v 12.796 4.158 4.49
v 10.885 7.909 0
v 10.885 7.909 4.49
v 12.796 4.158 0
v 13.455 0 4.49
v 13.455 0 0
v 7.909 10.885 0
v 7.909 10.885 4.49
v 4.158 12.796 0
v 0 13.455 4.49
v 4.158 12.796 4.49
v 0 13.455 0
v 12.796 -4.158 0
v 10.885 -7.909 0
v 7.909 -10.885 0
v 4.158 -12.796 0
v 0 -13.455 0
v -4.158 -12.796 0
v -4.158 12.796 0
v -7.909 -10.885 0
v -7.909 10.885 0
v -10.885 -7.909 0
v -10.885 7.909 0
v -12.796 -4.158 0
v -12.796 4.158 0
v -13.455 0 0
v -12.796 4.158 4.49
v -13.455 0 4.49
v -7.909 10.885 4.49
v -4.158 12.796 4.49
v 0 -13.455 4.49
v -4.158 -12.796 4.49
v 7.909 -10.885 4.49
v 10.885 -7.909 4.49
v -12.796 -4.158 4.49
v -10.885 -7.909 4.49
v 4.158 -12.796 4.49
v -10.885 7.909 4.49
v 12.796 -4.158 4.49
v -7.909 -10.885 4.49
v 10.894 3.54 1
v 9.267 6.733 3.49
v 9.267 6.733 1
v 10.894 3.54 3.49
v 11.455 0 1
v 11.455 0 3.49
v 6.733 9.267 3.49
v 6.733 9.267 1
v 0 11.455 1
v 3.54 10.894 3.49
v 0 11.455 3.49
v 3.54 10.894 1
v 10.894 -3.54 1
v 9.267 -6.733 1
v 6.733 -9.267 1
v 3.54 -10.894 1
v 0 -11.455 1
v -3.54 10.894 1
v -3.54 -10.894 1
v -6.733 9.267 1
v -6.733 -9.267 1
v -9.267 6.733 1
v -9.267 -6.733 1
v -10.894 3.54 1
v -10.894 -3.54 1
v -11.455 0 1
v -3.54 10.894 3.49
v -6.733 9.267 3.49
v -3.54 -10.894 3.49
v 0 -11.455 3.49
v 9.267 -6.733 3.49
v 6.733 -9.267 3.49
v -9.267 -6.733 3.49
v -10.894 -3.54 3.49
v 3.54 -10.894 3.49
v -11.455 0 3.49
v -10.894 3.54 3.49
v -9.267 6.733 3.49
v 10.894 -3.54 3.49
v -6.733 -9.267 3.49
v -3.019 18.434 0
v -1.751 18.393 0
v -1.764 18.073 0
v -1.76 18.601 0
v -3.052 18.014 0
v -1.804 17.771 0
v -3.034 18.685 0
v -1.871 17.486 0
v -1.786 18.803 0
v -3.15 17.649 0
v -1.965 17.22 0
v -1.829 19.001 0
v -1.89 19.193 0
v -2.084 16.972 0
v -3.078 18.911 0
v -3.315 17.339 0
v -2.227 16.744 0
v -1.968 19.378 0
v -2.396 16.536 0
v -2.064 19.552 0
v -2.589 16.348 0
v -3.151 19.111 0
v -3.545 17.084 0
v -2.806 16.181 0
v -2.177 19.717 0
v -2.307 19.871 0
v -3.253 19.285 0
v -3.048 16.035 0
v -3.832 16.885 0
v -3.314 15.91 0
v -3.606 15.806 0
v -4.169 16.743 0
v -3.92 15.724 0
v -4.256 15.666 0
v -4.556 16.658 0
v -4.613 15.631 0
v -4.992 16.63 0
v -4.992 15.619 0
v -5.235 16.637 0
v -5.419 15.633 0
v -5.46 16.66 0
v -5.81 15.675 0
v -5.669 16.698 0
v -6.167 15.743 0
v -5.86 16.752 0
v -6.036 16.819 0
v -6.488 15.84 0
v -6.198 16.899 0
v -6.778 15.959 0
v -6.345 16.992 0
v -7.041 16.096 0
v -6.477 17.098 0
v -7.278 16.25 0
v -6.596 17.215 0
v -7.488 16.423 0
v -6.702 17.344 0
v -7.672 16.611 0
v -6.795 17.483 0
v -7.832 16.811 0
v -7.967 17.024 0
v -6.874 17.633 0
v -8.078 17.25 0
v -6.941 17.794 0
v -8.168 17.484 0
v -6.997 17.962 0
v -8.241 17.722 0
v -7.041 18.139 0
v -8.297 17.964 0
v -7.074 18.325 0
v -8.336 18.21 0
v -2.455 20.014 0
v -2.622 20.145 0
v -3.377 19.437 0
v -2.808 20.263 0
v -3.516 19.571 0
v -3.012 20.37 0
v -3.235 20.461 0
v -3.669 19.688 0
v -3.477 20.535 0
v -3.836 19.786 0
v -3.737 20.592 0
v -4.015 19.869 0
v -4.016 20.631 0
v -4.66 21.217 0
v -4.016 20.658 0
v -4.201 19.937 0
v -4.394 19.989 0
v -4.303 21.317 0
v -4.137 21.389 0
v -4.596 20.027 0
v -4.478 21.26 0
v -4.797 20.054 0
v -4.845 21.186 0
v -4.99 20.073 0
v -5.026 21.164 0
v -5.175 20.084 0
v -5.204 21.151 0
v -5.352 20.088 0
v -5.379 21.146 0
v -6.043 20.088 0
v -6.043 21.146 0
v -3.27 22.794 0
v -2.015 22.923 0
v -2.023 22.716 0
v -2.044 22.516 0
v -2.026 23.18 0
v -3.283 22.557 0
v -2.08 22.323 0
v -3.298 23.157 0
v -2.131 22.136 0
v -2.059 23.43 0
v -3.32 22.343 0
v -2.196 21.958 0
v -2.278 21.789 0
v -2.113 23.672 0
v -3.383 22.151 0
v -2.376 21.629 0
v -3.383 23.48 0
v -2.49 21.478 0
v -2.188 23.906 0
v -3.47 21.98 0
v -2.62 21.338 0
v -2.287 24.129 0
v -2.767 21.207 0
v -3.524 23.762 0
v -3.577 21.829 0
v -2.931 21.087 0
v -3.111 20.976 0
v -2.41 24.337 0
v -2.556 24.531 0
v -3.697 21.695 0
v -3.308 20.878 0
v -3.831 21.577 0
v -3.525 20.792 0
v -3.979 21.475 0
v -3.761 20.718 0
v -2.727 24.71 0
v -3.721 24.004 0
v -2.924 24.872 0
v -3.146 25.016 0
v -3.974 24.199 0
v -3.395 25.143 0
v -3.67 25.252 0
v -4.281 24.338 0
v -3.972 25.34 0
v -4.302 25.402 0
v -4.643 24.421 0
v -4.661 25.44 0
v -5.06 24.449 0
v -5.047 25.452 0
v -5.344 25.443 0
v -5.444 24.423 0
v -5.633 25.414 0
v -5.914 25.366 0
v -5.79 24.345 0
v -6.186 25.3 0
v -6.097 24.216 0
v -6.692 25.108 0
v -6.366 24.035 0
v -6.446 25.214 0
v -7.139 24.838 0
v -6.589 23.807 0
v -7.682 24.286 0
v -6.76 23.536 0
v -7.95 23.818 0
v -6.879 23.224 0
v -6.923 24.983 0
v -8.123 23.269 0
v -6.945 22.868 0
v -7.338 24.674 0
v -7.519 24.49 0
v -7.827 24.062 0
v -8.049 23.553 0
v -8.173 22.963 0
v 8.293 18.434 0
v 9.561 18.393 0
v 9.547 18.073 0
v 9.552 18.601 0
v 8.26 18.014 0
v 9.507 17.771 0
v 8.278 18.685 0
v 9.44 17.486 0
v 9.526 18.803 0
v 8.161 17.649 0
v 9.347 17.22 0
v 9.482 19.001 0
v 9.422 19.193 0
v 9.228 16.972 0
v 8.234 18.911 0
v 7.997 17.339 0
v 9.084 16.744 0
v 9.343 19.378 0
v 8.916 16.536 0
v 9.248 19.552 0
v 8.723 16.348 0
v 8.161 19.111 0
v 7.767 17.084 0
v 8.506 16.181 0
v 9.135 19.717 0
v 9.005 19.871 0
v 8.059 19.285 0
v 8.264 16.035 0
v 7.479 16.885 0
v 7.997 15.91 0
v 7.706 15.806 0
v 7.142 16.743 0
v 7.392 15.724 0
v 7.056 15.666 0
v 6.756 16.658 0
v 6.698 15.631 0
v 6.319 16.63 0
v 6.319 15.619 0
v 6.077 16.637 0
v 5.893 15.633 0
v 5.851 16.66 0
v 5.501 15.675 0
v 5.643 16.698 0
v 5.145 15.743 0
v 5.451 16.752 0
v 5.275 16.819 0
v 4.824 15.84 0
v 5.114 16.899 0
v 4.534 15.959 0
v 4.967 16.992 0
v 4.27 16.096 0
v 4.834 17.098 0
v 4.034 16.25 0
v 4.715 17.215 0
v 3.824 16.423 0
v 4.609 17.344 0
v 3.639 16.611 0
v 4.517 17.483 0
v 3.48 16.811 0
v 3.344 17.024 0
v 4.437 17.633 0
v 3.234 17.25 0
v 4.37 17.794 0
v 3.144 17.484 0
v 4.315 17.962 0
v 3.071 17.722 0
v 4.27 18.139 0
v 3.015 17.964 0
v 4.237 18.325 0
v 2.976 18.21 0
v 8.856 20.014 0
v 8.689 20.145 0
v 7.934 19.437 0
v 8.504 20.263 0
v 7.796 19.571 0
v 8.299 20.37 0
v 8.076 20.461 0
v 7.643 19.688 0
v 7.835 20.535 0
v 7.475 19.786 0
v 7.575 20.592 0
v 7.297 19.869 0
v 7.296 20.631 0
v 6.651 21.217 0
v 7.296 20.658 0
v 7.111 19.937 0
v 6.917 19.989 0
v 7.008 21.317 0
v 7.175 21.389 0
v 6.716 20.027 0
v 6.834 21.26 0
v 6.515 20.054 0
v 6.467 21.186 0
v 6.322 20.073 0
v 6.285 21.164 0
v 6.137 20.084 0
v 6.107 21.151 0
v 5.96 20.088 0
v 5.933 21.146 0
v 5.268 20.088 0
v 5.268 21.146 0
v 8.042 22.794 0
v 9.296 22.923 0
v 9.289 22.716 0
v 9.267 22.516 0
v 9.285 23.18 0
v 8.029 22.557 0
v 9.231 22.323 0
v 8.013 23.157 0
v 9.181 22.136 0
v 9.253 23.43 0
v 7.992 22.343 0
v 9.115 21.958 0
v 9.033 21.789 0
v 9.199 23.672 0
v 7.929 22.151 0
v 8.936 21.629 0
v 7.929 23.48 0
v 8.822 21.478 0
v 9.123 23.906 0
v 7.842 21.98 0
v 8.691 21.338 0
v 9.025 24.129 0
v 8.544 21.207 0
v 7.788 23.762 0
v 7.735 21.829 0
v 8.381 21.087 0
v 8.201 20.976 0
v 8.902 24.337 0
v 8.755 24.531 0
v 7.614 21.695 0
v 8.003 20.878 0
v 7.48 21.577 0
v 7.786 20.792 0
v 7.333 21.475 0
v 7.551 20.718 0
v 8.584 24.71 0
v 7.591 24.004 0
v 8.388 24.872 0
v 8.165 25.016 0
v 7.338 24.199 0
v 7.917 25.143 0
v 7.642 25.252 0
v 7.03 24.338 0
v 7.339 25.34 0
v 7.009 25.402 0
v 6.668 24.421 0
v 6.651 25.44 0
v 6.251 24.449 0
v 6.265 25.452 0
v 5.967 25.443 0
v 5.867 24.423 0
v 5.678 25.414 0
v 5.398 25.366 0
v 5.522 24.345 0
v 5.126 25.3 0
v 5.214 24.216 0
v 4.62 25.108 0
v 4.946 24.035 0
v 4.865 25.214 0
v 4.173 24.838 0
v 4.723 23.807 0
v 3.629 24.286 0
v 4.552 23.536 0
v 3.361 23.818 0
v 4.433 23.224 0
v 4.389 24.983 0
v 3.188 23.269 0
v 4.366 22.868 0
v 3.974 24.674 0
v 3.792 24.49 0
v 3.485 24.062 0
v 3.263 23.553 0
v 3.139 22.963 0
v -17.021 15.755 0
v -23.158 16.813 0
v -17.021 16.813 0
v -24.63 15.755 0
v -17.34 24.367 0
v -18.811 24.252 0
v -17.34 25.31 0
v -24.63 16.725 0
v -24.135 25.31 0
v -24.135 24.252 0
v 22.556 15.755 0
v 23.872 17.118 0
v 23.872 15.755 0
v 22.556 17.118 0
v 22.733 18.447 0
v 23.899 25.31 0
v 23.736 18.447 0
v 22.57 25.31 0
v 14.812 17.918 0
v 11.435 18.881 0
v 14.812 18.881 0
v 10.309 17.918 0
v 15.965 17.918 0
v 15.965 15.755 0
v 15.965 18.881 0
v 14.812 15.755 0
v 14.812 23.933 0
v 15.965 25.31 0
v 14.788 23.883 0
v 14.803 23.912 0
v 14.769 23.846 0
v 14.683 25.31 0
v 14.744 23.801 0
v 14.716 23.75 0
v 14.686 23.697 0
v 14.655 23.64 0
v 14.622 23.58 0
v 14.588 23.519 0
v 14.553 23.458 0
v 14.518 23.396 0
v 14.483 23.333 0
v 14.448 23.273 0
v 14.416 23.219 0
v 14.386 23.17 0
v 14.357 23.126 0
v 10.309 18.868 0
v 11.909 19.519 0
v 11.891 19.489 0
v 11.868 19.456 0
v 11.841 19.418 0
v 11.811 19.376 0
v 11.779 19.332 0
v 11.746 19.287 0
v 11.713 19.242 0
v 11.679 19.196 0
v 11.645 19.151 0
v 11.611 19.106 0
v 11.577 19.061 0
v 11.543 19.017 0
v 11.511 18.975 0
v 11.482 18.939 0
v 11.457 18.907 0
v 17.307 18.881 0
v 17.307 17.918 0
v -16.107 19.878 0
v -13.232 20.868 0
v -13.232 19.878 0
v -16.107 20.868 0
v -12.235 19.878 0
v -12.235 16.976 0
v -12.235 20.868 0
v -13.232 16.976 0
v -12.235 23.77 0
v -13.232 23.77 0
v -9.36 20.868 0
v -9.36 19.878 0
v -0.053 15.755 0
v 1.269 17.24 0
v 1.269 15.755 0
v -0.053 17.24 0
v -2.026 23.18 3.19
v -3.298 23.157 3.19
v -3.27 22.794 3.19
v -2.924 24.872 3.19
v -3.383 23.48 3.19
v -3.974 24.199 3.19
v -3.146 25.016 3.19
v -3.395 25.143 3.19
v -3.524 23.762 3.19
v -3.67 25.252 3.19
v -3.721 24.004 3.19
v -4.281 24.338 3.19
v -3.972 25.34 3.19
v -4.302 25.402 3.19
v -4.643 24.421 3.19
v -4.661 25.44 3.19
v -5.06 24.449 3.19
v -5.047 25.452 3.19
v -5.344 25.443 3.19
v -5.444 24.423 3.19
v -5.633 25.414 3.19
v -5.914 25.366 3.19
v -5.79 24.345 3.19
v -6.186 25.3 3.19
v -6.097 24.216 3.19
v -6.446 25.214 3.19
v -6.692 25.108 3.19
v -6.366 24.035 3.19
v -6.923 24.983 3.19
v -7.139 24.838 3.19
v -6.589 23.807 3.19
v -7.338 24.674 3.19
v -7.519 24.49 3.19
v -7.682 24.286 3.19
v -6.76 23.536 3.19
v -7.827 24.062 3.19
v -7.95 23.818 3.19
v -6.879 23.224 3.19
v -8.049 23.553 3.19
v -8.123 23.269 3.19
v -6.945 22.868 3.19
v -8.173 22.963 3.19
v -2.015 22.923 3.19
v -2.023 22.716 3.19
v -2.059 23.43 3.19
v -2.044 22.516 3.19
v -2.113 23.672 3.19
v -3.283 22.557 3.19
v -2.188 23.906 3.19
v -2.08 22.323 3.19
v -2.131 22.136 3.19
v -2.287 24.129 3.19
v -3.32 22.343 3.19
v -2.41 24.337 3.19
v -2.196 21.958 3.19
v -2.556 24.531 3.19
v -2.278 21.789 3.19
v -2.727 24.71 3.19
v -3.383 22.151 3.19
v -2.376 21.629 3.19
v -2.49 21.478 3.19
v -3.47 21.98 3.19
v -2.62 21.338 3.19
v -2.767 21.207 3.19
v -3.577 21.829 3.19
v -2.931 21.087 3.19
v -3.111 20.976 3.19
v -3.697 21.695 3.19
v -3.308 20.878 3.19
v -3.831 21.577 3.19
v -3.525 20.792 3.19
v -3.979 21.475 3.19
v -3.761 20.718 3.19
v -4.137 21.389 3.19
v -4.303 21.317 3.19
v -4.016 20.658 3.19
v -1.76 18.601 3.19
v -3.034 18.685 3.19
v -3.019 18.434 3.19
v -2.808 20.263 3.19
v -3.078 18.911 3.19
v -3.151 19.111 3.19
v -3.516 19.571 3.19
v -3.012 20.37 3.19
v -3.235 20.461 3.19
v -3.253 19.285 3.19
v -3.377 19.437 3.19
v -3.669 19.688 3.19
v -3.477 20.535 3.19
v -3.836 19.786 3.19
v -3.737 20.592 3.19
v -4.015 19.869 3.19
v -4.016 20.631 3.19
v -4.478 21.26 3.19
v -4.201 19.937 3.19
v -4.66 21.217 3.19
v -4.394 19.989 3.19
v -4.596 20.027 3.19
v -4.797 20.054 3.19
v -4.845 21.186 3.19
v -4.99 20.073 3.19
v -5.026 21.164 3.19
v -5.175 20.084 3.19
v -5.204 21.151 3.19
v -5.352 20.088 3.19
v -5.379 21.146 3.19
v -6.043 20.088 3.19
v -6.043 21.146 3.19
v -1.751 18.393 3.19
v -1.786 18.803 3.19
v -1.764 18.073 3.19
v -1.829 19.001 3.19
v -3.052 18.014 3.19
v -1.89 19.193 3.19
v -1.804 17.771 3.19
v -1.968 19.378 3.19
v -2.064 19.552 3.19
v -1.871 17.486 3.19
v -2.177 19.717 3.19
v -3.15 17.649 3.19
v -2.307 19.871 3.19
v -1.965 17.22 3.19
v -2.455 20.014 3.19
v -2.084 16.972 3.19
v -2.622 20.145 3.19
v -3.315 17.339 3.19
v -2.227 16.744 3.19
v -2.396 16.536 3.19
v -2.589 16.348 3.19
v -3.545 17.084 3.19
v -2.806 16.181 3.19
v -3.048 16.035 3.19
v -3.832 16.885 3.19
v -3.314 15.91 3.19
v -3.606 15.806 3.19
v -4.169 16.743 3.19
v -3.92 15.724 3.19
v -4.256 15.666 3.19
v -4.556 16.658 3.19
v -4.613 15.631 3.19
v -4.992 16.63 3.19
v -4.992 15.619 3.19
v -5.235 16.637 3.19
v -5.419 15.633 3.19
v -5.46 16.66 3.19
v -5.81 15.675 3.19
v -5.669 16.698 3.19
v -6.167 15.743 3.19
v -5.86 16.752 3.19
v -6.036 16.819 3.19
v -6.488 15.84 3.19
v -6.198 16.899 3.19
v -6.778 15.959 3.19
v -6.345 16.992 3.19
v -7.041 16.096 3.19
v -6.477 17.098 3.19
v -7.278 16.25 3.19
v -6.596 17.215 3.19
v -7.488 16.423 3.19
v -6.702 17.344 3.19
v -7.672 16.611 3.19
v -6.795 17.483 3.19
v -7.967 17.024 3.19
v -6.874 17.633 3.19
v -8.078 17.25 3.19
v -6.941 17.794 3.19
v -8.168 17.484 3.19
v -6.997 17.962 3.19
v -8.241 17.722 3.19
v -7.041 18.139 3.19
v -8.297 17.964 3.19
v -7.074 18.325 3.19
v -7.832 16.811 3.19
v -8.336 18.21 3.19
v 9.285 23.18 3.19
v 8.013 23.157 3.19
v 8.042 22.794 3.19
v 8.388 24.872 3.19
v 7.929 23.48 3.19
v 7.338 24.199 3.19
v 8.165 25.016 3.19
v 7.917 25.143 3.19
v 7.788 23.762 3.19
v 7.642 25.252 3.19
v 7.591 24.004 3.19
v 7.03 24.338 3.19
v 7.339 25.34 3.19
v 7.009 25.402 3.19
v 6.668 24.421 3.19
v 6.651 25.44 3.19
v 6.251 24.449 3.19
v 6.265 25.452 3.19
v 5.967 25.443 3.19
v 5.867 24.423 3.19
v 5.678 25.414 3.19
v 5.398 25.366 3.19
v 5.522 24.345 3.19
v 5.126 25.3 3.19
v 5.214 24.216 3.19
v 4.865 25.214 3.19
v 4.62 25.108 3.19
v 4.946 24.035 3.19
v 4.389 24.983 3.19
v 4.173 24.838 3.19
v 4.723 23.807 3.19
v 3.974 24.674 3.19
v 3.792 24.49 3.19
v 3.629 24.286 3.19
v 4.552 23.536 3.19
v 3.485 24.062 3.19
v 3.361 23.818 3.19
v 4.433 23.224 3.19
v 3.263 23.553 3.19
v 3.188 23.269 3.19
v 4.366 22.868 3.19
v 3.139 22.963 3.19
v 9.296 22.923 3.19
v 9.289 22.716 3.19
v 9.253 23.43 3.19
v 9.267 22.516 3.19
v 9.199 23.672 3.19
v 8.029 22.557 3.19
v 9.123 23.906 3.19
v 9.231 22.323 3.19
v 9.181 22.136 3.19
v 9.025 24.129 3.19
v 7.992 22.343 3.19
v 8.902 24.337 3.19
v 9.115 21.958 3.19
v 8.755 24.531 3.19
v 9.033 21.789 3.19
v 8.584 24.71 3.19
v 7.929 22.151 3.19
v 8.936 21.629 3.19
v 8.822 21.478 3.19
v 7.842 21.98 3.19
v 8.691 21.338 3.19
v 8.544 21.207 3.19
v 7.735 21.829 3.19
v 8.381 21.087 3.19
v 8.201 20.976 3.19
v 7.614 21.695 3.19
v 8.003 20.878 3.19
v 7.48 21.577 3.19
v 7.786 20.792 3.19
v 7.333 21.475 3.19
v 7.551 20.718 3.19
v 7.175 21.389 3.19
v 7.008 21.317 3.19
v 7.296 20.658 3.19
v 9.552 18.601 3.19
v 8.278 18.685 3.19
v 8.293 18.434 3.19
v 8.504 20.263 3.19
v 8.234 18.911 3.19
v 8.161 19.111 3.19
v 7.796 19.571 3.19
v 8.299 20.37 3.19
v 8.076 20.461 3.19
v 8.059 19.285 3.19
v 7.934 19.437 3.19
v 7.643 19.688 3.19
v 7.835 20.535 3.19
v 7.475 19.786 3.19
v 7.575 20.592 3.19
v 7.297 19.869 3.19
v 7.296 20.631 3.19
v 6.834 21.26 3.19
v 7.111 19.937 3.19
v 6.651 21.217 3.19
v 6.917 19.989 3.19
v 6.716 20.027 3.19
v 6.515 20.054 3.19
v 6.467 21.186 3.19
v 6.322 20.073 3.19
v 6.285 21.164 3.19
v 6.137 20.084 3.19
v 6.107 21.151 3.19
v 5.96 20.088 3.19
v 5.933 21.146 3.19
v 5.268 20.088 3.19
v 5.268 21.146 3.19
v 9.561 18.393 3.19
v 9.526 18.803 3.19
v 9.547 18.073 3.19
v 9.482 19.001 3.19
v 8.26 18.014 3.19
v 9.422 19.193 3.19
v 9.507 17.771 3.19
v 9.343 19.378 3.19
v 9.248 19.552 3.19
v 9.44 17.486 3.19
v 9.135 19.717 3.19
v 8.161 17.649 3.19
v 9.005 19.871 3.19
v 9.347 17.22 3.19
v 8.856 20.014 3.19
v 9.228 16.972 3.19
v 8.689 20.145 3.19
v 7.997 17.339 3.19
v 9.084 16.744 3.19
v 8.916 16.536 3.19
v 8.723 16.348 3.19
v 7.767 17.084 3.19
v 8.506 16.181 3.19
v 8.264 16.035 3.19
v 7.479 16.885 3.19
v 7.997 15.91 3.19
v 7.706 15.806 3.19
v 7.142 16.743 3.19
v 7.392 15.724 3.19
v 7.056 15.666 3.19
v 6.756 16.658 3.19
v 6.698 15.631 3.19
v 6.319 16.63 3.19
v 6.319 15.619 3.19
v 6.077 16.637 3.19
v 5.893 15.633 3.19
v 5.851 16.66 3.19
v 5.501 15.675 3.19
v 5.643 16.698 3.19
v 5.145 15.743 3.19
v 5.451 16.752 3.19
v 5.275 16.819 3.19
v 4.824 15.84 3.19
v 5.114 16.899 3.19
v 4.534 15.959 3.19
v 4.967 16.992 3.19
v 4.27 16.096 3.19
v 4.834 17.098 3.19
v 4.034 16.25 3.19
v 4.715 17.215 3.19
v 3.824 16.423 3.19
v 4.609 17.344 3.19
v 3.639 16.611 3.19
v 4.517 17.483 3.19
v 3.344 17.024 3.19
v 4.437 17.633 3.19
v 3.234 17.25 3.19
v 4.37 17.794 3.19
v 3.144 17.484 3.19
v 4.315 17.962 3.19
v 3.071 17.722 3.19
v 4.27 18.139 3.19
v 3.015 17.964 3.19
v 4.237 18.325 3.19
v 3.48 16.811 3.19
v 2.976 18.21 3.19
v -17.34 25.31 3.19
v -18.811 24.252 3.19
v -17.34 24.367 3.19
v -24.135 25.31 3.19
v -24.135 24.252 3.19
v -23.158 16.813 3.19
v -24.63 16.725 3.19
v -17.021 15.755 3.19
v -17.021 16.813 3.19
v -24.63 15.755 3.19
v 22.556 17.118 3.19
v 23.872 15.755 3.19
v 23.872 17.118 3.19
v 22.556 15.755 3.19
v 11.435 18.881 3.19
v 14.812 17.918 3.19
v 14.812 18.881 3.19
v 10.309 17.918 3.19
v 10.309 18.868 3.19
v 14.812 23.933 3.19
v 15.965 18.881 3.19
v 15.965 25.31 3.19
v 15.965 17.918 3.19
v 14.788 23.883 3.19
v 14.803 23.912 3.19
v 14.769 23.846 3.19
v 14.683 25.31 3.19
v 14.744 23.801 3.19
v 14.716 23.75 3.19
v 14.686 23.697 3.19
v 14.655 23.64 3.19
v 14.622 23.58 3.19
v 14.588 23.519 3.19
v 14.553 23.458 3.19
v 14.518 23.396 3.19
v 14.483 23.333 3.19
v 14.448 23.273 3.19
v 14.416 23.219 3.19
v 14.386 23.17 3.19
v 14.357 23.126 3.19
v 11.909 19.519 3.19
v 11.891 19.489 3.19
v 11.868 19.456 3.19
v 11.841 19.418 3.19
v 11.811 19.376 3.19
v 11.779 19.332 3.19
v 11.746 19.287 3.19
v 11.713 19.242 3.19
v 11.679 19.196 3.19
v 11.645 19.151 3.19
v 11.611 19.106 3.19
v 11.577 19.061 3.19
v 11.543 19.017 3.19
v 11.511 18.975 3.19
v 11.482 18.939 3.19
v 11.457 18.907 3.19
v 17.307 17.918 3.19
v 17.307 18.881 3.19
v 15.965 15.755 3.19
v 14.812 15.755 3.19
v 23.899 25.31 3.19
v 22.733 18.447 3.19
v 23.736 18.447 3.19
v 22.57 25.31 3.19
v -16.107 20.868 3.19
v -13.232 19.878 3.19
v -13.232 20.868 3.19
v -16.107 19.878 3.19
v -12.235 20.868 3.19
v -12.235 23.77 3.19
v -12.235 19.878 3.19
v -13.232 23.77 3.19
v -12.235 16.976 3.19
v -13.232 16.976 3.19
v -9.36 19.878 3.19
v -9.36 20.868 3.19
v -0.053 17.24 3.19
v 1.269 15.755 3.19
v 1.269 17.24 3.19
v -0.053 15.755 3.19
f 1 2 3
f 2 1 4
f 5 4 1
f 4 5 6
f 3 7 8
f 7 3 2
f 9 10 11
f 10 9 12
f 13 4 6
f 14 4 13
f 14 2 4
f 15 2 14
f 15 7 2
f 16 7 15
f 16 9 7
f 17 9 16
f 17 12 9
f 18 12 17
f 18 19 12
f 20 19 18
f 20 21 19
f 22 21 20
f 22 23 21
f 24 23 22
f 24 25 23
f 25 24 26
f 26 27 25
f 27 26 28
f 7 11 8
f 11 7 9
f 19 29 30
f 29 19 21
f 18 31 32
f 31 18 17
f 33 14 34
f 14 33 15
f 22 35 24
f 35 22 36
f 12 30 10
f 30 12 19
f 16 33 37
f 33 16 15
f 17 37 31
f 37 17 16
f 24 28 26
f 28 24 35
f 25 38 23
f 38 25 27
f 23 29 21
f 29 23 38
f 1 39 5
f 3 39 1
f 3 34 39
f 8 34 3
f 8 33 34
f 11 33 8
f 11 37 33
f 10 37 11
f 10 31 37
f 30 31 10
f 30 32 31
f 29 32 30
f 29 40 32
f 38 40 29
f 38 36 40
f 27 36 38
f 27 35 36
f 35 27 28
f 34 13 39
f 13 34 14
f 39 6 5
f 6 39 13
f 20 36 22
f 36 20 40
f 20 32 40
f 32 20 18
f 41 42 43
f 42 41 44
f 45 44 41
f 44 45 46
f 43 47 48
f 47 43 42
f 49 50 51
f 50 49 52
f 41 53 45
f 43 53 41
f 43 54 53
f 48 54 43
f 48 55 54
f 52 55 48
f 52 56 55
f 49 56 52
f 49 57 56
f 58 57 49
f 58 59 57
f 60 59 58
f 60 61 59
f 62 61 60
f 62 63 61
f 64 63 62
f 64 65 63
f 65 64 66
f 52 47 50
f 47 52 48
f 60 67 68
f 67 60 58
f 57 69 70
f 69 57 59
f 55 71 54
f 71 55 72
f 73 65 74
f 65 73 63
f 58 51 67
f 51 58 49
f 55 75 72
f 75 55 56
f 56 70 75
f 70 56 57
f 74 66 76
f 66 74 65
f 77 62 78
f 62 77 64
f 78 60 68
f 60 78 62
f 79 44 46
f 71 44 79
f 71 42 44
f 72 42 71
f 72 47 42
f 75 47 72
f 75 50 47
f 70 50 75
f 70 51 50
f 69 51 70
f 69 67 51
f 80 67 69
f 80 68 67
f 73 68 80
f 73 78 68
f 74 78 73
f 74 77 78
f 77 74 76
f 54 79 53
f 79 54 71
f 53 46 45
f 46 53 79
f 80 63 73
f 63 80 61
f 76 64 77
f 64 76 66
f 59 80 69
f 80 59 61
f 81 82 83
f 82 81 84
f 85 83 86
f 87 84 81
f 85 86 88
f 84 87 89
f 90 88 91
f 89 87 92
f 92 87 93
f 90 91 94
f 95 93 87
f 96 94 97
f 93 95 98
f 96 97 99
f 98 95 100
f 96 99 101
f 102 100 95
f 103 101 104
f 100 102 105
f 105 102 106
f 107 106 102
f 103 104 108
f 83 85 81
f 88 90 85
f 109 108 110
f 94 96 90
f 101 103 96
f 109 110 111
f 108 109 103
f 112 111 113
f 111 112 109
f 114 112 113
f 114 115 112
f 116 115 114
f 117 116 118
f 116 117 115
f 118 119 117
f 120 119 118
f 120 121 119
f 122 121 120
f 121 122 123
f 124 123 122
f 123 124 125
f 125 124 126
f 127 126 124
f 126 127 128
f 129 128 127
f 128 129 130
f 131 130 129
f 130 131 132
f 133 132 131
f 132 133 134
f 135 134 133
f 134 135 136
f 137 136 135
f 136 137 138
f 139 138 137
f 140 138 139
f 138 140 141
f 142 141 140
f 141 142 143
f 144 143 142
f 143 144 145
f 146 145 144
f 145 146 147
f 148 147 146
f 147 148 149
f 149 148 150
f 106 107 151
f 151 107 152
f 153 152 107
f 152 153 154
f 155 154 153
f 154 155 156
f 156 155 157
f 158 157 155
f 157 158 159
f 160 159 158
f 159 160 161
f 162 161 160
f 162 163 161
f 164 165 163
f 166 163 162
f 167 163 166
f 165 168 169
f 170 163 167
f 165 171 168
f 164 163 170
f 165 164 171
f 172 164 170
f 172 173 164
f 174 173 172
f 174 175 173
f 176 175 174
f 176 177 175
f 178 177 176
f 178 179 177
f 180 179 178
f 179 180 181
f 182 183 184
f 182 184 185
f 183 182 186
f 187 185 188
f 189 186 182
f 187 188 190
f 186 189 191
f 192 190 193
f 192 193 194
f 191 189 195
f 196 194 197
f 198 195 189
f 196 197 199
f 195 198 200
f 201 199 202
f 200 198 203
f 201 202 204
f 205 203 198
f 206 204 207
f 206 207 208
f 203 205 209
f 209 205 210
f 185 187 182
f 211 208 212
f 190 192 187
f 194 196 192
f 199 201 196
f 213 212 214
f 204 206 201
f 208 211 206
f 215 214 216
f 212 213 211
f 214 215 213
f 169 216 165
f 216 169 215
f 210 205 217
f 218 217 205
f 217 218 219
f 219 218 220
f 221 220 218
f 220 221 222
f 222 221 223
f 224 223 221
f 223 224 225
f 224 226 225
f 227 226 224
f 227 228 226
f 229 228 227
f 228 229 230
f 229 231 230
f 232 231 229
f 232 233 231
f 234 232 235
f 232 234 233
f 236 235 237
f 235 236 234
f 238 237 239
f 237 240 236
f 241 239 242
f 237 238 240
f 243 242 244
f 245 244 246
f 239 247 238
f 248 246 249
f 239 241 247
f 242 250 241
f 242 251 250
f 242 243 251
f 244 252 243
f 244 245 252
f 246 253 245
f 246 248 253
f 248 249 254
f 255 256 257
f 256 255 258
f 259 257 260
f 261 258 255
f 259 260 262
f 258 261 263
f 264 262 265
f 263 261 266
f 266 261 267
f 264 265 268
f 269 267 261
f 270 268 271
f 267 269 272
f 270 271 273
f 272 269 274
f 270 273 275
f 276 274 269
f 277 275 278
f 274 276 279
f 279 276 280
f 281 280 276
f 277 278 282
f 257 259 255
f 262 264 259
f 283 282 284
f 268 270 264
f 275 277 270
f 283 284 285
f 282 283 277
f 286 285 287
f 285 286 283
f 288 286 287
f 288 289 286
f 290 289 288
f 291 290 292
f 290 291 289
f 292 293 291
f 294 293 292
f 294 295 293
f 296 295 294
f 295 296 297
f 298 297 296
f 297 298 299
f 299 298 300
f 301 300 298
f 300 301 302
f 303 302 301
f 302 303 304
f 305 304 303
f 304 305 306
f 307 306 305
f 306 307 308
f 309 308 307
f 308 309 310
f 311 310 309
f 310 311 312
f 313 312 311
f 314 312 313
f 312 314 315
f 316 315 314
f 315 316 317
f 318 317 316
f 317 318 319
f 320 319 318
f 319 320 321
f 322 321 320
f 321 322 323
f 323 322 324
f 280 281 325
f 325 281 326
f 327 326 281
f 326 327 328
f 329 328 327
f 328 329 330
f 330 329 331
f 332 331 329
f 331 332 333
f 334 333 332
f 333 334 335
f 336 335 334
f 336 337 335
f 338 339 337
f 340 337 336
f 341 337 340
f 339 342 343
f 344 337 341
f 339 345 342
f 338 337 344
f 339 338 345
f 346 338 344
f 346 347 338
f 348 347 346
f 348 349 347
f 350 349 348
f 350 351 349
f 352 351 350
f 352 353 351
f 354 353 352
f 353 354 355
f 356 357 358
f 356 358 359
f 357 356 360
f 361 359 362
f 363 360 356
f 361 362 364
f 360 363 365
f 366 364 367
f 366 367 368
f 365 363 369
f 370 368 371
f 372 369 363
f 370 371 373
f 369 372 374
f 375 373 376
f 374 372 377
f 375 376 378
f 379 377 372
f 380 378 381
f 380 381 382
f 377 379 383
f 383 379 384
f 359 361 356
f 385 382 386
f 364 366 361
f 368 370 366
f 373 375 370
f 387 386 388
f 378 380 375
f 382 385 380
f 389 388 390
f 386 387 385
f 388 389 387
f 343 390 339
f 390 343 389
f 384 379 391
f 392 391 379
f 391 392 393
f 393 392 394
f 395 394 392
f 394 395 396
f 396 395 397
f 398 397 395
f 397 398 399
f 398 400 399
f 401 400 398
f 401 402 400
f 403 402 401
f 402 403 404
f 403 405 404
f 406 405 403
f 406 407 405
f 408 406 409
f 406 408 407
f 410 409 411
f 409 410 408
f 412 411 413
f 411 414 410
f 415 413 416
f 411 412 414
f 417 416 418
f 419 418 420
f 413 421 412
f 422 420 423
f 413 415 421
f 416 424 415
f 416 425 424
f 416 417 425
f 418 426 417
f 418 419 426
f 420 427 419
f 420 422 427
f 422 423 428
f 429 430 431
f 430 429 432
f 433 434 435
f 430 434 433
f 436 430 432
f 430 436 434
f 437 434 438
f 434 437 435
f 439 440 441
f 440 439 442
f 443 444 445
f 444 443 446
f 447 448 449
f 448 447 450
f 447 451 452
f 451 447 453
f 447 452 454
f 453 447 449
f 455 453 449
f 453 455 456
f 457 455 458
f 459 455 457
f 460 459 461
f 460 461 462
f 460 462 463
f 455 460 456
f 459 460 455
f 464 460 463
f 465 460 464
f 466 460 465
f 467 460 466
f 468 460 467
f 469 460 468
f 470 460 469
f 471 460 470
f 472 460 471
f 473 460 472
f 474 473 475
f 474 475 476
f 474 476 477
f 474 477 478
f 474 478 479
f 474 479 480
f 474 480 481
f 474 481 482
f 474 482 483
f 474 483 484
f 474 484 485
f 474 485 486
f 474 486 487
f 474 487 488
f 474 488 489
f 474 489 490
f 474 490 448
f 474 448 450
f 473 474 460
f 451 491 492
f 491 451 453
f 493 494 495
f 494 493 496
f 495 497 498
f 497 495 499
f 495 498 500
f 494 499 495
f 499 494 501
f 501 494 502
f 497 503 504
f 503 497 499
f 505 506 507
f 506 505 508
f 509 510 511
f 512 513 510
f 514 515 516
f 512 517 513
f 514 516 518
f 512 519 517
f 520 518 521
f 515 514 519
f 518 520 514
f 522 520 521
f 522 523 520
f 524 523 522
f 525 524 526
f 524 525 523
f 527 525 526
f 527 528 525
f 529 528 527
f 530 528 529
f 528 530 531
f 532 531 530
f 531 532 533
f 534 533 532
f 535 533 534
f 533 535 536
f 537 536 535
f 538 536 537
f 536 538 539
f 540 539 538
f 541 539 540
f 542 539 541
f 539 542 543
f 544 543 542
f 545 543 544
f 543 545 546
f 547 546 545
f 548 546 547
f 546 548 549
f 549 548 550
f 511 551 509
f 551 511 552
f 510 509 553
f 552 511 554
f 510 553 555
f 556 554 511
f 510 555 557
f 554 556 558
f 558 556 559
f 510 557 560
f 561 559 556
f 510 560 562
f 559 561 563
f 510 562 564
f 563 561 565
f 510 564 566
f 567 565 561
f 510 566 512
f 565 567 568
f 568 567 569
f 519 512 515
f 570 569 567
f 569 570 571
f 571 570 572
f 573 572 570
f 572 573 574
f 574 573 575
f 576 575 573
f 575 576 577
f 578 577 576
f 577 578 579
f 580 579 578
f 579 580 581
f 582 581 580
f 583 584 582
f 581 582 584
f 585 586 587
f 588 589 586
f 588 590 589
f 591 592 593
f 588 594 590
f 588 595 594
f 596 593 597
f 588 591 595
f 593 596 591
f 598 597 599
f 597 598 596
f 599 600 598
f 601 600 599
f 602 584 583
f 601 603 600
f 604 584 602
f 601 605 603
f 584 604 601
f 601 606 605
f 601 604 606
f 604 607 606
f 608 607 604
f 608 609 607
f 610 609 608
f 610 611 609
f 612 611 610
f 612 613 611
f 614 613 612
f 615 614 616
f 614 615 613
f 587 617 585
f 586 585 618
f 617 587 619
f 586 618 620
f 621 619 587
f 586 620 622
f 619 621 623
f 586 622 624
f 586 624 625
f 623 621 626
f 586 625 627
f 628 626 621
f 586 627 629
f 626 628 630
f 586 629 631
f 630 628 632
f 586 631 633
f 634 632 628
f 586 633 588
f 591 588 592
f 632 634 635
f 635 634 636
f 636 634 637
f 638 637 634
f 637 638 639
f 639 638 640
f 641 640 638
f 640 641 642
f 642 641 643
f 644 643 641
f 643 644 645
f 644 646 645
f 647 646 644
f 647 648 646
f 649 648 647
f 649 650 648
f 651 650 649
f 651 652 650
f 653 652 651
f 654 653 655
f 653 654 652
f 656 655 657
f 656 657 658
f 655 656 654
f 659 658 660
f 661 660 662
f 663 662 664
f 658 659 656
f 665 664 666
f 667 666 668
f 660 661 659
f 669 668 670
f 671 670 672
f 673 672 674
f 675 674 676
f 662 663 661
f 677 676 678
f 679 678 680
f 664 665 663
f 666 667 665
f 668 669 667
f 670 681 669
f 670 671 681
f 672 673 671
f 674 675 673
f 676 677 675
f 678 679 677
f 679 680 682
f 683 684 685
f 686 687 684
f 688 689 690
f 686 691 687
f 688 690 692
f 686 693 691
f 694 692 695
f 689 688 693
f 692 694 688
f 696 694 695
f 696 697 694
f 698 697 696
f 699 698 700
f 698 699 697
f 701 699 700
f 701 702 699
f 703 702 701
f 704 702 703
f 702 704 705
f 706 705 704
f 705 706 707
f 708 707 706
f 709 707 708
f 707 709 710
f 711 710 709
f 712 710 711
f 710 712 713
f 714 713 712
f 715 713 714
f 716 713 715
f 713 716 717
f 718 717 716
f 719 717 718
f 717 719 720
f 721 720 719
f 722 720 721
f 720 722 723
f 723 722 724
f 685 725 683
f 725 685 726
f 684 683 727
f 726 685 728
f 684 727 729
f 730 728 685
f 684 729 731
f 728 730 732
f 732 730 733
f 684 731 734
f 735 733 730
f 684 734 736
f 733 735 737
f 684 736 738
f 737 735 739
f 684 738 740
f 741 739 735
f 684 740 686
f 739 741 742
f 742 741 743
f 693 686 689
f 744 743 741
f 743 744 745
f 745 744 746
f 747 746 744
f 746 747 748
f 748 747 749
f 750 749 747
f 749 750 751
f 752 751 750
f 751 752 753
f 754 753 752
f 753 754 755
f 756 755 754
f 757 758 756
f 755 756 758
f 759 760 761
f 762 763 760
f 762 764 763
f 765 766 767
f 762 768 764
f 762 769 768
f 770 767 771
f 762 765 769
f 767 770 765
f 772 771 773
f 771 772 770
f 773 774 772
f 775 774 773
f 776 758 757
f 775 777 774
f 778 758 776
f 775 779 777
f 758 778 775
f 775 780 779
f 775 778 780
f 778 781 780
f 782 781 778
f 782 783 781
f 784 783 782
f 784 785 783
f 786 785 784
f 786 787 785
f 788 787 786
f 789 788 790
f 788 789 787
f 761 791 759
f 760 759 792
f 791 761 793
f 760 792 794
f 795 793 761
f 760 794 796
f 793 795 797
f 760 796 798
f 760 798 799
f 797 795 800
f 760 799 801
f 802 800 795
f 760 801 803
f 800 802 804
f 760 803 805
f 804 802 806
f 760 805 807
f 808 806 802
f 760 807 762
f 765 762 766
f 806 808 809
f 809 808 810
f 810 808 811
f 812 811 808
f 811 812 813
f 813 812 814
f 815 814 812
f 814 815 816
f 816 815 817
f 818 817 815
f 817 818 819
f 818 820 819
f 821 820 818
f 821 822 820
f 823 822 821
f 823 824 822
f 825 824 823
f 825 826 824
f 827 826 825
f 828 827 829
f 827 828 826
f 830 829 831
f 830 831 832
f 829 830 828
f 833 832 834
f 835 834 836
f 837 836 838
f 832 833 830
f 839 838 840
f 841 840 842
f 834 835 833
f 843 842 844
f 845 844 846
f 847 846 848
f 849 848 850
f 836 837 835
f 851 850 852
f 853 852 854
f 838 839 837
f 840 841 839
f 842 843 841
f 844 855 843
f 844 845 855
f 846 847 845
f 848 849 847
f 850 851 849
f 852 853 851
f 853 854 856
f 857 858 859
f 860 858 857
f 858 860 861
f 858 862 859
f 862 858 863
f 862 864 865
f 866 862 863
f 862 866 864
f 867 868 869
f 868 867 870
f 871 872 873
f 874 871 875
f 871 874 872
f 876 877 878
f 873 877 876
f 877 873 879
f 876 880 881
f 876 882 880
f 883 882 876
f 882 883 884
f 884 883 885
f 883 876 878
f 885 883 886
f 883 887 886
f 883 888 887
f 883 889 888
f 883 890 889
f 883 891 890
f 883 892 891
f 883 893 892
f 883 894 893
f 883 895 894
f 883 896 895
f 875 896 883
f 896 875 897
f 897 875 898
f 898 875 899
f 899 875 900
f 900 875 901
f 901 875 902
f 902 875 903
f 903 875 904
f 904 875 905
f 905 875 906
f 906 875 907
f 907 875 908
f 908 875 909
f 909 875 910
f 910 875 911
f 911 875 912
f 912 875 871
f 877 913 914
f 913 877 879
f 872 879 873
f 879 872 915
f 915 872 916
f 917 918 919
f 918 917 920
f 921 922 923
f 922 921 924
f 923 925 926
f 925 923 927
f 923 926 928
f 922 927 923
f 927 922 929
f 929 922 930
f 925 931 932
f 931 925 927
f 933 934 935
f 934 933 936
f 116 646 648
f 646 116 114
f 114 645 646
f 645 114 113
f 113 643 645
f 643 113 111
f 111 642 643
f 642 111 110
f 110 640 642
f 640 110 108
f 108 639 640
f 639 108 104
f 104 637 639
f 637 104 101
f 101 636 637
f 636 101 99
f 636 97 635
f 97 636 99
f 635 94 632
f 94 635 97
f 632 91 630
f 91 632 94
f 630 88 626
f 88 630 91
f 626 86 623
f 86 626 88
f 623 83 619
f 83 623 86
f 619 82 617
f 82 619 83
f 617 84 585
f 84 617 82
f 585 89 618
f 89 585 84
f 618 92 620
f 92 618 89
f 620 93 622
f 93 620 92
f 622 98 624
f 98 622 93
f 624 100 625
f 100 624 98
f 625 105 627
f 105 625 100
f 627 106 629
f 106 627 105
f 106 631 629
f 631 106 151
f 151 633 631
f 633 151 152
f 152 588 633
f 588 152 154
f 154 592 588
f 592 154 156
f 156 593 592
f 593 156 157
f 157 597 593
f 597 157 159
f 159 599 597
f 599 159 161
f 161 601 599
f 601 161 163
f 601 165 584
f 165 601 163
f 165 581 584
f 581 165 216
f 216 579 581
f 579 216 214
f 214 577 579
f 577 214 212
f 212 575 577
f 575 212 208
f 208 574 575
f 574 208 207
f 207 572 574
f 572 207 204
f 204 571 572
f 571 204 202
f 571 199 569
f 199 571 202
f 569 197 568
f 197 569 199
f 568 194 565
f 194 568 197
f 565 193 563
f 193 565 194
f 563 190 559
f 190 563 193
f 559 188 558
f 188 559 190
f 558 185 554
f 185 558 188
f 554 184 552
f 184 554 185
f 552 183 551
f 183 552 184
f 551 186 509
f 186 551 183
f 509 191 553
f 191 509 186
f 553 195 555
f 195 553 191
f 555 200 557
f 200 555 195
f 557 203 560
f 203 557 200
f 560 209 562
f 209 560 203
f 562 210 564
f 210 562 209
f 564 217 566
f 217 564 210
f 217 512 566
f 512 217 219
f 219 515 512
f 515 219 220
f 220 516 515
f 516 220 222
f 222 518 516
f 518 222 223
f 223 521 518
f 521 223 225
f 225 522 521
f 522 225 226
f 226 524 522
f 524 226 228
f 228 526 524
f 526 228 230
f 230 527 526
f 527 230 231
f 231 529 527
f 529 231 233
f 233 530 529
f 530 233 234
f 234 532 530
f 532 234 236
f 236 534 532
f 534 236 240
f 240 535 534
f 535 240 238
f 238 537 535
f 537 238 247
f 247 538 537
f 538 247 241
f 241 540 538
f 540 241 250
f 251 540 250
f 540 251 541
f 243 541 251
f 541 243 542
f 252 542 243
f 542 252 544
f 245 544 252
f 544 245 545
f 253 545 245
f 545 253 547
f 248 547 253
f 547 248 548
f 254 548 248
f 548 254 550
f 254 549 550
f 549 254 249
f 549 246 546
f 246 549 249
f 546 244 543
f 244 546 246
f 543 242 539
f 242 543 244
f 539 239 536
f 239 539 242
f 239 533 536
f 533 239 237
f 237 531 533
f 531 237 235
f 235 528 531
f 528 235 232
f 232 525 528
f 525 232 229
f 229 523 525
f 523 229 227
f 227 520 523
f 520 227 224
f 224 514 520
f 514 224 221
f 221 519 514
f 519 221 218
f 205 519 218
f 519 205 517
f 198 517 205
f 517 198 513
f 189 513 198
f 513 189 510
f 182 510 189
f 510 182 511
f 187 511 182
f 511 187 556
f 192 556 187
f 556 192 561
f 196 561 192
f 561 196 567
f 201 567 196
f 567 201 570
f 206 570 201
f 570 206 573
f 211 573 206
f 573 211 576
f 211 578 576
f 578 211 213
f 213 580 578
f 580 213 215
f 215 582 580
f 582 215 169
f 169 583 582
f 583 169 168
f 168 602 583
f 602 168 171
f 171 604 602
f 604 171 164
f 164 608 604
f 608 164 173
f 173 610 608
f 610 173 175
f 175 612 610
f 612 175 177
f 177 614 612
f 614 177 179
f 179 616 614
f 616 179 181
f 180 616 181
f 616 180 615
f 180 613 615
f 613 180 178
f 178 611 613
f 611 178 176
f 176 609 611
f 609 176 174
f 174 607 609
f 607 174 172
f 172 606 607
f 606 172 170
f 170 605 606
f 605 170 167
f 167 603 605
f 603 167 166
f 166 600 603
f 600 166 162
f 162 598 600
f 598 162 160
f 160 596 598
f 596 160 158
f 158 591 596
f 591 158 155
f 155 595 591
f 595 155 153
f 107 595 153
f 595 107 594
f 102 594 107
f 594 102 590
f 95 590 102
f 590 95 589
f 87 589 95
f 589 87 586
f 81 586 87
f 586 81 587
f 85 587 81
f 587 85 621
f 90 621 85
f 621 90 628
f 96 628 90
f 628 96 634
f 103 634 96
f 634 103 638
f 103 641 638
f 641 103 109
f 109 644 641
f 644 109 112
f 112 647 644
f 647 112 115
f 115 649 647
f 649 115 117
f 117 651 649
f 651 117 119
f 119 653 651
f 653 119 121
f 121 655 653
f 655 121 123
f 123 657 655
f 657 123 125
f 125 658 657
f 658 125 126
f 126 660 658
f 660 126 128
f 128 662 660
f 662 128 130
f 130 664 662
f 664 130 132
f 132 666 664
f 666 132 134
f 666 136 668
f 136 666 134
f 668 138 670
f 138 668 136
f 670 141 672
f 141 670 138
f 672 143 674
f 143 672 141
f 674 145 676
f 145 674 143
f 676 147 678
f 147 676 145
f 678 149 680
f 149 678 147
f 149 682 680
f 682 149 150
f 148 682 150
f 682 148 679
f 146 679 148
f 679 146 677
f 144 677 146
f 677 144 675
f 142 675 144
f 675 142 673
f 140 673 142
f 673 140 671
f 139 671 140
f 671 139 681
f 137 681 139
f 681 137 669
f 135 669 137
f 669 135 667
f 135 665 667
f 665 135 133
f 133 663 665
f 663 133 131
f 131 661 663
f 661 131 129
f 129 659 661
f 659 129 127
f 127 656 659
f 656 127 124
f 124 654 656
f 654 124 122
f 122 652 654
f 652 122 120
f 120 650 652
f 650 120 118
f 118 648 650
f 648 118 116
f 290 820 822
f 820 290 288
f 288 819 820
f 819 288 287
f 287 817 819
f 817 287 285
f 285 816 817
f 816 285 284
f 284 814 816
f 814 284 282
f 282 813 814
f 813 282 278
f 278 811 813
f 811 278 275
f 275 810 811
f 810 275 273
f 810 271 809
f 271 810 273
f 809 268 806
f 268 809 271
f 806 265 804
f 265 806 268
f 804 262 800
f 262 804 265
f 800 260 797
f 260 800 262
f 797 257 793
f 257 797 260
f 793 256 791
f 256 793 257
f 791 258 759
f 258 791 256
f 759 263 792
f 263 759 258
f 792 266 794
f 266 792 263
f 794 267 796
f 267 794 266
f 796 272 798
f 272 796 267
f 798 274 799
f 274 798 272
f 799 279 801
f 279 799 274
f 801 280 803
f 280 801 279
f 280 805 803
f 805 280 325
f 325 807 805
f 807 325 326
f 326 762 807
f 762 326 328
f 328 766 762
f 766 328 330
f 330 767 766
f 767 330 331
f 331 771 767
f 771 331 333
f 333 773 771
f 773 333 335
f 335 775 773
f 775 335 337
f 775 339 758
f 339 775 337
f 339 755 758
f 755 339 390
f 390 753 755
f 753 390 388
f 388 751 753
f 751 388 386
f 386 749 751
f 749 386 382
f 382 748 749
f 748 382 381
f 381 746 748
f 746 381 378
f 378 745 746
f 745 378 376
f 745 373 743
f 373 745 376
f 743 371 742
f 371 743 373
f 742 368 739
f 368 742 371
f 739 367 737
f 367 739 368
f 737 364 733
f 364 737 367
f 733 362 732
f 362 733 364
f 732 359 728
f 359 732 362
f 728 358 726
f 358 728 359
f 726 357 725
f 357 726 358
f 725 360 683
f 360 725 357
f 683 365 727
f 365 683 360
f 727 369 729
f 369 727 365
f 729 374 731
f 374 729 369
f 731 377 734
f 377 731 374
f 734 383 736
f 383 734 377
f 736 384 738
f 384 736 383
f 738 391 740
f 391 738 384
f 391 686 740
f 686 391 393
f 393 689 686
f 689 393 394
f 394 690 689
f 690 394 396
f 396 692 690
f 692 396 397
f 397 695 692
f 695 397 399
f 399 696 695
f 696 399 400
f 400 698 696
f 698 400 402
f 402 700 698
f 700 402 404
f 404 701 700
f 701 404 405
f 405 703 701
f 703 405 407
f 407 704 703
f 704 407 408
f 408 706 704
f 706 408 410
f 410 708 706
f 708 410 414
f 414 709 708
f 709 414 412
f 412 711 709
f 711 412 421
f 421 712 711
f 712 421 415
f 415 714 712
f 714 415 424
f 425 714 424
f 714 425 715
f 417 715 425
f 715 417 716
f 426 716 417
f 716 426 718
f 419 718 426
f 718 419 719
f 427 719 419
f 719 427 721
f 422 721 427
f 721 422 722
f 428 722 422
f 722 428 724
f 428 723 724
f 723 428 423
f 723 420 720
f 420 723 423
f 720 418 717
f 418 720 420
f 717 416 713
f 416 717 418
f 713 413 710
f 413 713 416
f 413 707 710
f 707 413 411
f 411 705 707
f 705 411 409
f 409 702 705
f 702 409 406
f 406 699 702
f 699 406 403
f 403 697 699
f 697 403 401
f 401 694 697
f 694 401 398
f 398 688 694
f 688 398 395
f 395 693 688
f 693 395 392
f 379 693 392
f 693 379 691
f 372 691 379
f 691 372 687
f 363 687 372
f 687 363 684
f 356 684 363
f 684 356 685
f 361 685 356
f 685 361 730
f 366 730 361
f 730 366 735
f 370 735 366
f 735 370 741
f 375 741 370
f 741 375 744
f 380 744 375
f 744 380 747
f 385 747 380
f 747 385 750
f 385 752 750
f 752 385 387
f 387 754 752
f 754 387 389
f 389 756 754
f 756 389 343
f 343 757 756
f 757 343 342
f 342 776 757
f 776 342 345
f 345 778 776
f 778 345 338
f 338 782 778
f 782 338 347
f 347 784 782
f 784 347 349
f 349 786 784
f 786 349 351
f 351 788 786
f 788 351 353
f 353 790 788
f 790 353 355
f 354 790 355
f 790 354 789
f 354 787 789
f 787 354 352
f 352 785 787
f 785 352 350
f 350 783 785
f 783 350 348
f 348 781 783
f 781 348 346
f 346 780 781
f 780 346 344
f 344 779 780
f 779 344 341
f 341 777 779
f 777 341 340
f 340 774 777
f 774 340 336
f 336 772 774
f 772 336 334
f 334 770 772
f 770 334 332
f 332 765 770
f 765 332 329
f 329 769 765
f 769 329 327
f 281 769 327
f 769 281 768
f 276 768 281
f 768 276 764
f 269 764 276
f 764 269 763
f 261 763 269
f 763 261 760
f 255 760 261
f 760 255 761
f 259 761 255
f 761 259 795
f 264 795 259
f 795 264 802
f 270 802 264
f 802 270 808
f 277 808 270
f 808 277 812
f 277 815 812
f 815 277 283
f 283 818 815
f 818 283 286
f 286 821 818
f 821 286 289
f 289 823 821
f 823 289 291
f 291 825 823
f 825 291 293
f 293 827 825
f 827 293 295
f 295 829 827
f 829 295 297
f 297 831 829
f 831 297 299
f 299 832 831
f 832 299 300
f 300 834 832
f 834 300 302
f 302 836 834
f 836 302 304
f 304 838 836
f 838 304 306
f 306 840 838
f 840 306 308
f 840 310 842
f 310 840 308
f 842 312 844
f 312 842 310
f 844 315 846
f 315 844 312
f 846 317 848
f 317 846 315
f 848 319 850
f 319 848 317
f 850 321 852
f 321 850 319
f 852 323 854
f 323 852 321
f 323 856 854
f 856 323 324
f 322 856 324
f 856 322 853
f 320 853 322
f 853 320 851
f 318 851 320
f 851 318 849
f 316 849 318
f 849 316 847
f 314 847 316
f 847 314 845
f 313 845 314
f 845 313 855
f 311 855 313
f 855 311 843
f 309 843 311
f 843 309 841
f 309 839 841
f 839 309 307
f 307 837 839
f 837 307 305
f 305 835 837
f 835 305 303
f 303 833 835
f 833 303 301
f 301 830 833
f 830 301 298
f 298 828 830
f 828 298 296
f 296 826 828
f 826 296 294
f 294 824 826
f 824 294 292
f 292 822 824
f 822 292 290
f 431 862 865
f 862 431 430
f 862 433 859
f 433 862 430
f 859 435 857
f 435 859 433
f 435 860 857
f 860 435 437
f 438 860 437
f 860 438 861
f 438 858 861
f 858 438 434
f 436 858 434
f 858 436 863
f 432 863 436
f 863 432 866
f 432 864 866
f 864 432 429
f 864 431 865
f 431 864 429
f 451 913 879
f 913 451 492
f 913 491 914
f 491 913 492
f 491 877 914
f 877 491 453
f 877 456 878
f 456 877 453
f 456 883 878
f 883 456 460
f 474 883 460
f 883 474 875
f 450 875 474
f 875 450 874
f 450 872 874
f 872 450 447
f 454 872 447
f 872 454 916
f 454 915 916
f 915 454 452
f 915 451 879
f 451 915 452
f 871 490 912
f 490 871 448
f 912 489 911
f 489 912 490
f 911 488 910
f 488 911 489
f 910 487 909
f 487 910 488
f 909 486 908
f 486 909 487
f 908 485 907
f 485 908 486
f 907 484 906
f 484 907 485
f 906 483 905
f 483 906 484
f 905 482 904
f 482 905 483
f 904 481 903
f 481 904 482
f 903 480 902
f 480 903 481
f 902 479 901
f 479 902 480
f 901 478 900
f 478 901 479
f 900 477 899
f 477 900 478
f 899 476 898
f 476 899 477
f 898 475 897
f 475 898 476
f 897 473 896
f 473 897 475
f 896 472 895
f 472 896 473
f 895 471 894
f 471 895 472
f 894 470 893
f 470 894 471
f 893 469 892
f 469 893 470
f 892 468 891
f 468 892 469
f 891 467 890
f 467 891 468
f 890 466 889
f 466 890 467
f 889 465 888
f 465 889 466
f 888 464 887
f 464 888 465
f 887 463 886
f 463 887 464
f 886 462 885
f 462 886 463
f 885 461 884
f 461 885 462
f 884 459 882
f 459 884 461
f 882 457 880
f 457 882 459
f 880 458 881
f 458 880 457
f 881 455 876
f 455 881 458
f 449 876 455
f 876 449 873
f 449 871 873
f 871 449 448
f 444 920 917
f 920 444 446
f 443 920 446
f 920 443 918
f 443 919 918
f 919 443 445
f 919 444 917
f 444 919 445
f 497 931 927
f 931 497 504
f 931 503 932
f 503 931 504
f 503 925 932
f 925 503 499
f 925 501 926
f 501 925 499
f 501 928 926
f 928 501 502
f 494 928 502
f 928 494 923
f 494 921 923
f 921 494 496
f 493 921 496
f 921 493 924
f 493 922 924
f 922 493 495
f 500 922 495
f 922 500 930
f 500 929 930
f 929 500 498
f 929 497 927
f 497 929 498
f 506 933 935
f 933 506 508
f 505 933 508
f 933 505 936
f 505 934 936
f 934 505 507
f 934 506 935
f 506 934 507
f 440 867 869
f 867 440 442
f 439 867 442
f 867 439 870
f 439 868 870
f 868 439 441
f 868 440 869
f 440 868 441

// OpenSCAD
//This is Coin Hider Parametric v1. You can use this print to hide a coin as a prank or to keep your coins in mint condition.

//Pause printing to insert coin, or print two or more coins far apart and insert the coins when it's printing the external perimeter of the other coin(s).

di=22.31;   //enter coin diameter
he=2.19;    //enter coin height
ml=0.15;    //enter margin under/above coin. Tip: At least your layer thickness.
me=0.30;    //enter margin around coin. Tip: At least your extrude size.
tp=2.00;    //enter thickness of perimeter
ts=1.00;    //enter thickness of top/bottom
fr=20;      //enter number of fragments

translate([0,0,(he+2*ml+2*ts)/2])
    difference()
        {
            cylinder (h=he+2*ml+2*ts,d1=di+2*me+2*tp,d2=di+2*me+2*tp,$fn=fr,center=true);
            cylinder(h=he+2*ml,d1=di+2*me,d2=di+2*me,$fn=fr,center=true);
        };
    

te=str("Z+", (ts+ml+he), " !");
linear_extrude(height = ts+he, center = false, convexity = 10, twist = 0)
        translate([0,di/2+2*me+2*tp,0.5])
        text(te,size=10,halign="center",valign="baseline");
    
echo(te);
